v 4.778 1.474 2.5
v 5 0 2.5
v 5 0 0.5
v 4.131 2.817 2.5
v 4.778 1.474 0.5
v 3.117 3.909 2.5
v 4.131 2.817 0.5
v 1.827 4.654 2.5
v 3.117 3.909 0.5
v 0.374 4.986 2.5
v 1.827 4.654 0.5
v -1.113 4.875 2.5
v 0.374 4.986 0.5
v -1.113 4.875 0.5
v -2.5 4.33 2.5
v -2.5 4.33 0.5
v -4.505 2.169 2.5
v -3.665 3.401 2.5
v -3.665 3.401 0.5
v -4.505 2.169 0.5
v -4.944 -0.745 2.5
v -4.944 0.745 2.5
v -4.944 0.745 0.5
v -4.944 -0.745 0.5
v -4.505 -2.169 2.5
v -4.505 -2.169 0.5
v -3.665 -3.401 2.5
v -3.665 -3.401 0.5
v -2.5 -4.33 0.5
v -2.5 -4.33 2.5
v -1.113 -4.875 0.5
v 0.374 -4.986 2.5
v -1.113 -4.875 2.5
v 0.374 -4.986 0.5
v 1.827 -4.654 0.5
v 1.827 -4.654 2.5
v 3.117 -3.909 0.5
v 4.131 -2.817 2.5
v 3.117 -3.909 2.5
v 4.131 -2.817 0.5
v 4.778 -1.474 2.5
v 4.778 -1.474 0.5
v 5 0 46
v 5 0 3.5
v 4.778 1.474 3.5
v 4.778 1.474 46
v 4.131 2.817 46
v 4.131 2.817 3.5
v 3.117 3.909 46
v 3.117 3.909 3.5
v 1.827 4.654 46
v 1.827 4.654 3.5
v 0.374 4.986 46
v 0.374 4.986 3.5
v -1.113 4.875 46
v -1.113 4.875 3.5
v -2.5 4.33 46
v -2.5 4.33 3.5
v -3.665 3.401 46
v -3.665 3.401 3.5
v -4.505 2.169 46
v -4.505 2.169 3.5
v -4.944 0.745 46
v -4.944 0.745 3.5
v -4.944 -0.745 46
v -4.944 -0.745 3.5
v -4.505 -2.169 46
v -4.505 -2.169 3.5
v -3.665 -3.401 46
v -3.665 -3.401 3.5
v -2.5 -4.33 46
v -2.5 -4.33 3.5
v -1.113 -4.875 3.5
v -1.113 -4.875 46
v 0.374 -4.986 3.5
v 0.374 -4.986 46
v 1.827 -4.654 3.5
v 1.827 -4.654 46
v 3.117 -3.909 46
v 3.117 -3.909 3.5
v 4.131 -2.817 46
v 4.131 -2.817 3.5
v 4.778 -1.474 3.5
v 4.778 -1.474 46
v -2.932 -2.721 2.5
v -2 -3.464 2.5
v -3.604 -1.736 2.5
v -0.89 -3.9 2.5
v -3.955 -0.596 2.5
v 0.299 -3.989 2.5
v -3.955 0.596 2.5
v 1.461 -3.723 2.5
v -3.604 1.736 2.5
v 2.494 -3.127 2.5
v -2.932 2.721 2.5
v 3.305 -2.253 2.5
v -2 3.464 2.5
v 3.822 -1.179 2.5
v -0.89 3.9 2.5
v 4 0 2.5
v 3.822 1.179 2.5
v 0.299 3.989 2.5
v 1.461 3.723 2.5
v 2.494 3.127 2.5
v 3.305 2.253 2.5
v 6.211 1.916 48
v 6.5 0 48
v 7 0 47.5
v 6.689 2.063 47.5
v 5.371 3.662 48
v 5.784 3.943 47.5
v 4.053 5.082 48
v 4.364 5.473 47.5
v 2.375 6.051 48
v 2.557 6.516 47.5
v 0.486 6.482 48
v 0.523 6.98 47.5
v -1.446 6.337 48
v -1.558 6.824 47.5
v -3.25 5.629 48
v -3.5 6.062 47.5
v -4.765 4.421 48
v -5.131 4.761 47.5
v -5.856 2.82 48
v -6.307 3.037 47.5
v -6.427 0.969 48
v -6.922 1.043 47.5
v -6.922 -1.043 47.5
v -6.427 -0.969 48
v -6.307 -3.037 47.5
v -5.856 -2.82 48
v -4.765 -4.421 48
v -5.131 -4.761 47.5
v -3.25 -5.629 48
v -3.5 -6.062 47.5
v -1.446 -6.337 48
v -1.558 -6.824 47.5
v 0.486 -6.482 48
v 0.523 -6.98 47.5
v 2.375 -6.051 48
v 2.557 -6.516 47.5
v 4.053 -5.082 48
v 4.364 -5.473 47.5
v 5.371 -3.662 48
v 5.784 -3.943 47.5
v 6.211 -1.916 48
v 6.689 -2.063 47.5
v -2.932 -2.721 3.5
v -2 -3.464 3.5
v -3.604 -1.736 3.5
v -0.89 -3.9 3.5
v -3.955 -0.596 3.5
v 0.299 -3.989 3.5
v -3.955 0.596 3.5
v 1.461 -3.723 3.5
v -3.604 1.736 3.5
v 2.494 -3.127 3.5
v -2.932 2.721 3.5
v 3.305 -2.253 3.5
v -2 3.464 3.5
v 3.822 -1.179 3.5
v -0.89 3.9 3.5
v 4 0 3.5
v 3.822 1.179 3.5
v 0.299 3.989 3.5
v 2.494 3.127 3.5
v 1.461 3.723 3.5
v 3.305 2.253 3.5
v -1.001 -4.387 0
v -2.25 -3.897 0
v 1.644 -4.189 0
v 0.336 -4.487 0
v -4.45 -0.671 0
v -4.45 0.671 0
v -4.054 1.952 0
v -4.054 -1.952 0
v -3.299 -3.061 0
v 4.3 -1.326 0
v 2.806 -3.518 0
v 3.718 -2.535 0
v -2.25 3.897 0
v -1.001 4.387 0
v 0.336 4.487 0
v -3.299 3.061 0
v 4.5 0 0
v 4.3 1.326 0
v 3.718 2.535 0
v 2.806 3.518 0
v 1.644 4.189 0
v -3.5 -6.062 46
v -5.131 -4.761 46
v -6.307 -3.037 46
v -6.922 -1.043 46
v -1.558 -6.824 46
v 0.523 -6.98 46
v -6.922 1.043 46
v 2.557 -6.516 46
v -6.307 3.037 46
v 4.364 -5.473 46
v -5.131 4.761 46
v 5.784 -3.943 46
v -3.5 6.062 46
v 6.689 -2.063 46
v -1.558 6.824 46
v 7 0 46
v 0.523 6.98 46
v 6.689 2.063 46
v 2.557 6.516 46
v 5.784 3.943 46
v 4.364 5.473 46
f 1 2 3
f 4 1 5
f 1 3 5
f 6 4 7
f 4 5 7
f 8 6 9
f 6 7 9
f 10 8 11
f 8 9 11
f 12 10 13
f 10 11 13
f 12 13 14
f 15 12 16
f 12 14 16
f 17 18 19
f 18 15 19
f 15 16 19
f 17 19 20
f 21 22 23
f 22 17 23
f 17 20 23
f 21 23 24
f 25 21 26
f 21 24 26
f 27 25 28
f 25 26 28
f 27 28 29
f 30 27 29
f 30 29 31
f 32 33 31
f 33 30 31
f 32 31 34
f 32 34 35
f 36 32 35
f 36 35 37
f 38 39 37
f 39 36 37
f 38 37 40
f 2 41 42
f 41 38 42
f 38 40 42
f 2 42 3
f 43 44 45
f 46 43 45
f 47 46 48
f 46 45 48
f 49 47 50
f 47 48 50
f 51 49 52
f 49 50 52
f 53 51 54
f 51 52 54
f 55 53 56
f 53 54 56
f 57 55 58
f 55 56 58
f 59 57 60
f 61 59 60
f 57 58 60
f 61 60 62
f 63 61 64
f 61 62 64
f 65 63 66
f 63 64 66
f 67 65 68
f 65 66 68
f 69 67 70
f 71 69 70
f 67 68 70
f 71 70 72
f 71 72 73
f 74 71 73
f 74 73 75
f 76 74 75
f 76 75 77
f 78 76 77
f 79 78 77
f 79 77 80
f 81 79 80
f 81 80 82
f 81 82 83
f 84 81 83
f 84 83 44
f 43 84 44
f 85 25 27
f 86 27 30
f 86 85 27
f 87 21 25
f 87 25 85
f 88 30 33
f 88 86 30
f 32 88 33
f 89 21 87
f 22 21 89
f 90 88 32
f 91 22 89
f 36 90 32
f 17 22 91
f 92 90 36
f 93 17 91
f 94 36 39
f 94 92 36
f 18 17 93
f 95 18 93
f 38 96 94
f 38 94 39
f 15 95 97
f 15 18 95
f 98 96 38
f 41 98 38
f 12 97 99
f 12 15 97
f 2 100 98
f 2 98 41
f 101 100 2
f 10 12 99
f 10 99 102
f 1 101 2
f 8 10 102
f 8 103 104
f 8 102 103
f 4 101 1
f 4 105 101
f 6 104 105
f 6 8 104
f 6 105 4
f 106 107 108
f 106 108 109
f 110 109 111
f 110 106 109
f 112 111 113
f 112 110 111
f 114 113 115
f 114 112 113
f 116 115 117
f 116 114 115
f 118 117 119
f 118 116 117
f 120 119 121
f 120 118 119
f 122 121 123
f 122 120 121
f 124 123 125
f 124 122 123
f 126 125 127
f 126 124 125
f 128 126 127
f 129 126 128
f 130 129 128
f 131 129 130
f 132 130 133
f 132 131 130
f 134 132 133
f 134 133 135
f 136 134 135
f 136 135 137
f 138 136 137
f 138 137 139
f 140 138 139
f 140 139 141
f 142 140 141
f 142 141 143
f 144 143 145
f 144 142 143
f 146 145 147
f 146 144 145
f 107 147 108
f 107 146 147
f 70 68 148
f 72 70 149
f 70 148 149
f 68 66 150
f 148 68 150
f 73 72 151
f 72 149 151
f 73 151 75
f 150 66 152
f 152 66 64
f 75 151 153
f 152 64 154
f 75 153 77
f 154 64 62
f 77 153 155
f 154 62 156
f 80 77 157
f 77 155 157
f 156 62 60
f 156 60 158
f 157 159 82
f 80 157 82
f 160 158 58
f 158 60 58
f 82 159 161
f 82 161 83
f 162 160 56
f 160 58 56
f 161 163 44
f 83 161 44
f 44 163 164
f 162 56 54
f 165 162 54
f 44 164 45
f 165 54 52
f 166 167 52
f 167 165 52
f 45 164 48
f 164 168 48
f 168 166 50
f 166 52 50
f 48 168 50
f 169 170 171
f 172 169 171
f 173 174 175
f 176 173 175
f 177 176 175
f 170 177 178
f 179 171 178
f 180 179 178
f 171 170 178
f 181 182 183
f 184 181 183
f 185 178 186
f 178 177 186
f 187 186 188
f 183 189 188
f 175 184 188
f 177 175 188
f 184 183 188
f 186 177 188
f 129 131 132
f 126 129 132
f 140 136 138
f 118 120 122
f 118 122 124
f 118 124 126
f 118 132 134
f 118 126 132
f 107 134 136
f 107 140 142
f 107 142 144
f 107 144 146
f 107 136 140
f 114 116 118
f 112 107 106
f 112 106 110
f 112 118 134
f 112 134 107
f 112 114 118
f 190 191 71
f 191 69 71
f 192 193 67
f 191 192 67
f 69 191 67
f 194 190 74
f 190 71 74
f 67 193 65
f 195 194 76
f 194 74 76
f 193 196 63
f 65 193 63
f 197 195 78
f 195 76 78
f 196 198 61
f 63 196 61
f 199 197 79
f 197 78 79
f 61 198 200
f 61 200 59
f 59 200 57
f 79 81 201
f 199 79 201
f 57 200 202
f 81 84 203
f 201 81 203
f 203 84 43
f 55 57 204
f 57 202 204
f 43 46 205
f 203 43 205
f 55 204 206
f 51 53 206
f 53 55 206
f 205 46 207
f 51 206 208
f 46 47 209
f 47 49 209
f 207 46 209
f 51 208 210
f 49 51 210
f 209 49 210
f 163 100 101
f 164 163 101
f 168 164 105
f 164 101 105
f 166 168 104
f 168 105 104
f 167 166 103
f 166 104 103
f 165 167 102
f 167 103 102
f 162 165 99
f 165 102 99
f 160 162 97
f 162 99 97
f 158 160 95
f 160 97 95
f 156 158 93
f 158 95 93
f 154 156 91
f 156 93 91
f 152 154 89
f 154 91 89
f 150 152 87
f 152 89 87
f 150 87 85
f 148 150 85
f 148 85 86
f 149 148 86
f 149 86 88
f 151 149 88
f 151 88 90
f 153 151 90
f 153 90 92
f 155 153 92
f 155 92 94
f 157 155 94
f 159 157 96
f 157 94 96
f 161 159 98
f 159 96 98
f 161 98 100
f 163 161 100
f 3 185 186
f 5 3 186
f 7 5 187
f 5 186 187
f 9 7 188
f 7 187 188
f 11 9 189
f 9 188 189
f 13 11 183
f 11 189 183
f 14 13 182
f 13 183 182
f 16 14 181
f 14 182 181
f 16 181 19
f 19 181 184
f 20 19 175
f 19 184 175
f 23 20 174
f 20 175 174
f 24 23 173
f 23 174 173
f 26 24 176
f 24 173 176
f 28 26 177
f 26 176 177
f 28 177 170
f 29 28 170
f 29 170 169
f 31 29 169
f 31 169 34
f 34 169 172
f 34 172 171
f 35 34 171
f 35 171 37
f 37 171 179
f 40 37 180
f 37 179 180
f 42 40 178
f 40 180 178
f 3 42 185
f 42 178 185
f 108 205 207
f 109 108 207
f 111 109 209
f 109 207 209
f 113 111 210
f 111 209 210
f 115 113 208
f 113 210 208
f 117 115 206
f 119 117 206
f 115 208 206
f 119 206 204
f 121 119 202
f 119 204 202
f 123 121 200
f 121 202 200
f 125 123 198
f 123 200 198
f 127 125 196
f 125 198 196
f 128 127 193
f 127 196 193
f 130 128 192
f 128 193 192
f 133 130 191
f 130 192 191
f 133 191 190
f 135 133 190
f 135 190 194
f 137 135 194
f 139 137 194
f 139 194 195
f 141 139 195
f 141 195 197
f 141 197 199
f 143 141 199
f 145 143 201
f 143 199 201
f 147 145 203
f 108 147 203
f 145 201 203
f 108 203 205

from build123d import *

# Parameters (mm, degrees)
SKETCH_1_R          = 5
EXTRUDE_1_DEPTH     = 46
SKETCH_2_R          = 7
EXTRUDE_2_DEPTH     = 2
CHAMFER_1_SIZE      = 0.5
CUT_EXTRUDE_START   = 2.5
SKETCH_3_R          = 14
SKETCH_3_R_2        = 4
CUT_EXTRUDE_1_DEPTH = 1


with BuildPart() as part:
    # 草图1 → 凸台-拉伸1 (new body)
    with BuildSketch(Plane.XY):
        Circle(SKETCH_1_R)
    extrude(amount=EXTRUDE_1_DEPTH)

    # 草图2 → 凸台-拉伸2 (add)
    with BuildSketch(Plane.XY.offset(46)):
        Circle(SKETCH_2_R)
    extrude(amount=EXTRUDE_2_DEPTH)

    # 倒角1
    chamfer_1_edges = [part.edges().sort_by_distance(p)[0] for p in [
        (-5, 0, 0),
        (-7, 0, 48),
    ]]
    chamfer(chamfer_1_edges, length=CHAMFER_1_SIZE)

    # 草图3 → 切除-拉伸-薄壁1 (cut)
    with BuildSketch(Plane.XY.offset(CUT_EXTRUDE_START)):
        Circle(SKETCH_3_R)
        Circle(SKETCH_3_R_2, mode=Mode.SUBTRACT)
    extrude(amount=CUT_EXTRUDE_1_DEPTH, mode=Mode.SUBTRACT)


solid = part.part
